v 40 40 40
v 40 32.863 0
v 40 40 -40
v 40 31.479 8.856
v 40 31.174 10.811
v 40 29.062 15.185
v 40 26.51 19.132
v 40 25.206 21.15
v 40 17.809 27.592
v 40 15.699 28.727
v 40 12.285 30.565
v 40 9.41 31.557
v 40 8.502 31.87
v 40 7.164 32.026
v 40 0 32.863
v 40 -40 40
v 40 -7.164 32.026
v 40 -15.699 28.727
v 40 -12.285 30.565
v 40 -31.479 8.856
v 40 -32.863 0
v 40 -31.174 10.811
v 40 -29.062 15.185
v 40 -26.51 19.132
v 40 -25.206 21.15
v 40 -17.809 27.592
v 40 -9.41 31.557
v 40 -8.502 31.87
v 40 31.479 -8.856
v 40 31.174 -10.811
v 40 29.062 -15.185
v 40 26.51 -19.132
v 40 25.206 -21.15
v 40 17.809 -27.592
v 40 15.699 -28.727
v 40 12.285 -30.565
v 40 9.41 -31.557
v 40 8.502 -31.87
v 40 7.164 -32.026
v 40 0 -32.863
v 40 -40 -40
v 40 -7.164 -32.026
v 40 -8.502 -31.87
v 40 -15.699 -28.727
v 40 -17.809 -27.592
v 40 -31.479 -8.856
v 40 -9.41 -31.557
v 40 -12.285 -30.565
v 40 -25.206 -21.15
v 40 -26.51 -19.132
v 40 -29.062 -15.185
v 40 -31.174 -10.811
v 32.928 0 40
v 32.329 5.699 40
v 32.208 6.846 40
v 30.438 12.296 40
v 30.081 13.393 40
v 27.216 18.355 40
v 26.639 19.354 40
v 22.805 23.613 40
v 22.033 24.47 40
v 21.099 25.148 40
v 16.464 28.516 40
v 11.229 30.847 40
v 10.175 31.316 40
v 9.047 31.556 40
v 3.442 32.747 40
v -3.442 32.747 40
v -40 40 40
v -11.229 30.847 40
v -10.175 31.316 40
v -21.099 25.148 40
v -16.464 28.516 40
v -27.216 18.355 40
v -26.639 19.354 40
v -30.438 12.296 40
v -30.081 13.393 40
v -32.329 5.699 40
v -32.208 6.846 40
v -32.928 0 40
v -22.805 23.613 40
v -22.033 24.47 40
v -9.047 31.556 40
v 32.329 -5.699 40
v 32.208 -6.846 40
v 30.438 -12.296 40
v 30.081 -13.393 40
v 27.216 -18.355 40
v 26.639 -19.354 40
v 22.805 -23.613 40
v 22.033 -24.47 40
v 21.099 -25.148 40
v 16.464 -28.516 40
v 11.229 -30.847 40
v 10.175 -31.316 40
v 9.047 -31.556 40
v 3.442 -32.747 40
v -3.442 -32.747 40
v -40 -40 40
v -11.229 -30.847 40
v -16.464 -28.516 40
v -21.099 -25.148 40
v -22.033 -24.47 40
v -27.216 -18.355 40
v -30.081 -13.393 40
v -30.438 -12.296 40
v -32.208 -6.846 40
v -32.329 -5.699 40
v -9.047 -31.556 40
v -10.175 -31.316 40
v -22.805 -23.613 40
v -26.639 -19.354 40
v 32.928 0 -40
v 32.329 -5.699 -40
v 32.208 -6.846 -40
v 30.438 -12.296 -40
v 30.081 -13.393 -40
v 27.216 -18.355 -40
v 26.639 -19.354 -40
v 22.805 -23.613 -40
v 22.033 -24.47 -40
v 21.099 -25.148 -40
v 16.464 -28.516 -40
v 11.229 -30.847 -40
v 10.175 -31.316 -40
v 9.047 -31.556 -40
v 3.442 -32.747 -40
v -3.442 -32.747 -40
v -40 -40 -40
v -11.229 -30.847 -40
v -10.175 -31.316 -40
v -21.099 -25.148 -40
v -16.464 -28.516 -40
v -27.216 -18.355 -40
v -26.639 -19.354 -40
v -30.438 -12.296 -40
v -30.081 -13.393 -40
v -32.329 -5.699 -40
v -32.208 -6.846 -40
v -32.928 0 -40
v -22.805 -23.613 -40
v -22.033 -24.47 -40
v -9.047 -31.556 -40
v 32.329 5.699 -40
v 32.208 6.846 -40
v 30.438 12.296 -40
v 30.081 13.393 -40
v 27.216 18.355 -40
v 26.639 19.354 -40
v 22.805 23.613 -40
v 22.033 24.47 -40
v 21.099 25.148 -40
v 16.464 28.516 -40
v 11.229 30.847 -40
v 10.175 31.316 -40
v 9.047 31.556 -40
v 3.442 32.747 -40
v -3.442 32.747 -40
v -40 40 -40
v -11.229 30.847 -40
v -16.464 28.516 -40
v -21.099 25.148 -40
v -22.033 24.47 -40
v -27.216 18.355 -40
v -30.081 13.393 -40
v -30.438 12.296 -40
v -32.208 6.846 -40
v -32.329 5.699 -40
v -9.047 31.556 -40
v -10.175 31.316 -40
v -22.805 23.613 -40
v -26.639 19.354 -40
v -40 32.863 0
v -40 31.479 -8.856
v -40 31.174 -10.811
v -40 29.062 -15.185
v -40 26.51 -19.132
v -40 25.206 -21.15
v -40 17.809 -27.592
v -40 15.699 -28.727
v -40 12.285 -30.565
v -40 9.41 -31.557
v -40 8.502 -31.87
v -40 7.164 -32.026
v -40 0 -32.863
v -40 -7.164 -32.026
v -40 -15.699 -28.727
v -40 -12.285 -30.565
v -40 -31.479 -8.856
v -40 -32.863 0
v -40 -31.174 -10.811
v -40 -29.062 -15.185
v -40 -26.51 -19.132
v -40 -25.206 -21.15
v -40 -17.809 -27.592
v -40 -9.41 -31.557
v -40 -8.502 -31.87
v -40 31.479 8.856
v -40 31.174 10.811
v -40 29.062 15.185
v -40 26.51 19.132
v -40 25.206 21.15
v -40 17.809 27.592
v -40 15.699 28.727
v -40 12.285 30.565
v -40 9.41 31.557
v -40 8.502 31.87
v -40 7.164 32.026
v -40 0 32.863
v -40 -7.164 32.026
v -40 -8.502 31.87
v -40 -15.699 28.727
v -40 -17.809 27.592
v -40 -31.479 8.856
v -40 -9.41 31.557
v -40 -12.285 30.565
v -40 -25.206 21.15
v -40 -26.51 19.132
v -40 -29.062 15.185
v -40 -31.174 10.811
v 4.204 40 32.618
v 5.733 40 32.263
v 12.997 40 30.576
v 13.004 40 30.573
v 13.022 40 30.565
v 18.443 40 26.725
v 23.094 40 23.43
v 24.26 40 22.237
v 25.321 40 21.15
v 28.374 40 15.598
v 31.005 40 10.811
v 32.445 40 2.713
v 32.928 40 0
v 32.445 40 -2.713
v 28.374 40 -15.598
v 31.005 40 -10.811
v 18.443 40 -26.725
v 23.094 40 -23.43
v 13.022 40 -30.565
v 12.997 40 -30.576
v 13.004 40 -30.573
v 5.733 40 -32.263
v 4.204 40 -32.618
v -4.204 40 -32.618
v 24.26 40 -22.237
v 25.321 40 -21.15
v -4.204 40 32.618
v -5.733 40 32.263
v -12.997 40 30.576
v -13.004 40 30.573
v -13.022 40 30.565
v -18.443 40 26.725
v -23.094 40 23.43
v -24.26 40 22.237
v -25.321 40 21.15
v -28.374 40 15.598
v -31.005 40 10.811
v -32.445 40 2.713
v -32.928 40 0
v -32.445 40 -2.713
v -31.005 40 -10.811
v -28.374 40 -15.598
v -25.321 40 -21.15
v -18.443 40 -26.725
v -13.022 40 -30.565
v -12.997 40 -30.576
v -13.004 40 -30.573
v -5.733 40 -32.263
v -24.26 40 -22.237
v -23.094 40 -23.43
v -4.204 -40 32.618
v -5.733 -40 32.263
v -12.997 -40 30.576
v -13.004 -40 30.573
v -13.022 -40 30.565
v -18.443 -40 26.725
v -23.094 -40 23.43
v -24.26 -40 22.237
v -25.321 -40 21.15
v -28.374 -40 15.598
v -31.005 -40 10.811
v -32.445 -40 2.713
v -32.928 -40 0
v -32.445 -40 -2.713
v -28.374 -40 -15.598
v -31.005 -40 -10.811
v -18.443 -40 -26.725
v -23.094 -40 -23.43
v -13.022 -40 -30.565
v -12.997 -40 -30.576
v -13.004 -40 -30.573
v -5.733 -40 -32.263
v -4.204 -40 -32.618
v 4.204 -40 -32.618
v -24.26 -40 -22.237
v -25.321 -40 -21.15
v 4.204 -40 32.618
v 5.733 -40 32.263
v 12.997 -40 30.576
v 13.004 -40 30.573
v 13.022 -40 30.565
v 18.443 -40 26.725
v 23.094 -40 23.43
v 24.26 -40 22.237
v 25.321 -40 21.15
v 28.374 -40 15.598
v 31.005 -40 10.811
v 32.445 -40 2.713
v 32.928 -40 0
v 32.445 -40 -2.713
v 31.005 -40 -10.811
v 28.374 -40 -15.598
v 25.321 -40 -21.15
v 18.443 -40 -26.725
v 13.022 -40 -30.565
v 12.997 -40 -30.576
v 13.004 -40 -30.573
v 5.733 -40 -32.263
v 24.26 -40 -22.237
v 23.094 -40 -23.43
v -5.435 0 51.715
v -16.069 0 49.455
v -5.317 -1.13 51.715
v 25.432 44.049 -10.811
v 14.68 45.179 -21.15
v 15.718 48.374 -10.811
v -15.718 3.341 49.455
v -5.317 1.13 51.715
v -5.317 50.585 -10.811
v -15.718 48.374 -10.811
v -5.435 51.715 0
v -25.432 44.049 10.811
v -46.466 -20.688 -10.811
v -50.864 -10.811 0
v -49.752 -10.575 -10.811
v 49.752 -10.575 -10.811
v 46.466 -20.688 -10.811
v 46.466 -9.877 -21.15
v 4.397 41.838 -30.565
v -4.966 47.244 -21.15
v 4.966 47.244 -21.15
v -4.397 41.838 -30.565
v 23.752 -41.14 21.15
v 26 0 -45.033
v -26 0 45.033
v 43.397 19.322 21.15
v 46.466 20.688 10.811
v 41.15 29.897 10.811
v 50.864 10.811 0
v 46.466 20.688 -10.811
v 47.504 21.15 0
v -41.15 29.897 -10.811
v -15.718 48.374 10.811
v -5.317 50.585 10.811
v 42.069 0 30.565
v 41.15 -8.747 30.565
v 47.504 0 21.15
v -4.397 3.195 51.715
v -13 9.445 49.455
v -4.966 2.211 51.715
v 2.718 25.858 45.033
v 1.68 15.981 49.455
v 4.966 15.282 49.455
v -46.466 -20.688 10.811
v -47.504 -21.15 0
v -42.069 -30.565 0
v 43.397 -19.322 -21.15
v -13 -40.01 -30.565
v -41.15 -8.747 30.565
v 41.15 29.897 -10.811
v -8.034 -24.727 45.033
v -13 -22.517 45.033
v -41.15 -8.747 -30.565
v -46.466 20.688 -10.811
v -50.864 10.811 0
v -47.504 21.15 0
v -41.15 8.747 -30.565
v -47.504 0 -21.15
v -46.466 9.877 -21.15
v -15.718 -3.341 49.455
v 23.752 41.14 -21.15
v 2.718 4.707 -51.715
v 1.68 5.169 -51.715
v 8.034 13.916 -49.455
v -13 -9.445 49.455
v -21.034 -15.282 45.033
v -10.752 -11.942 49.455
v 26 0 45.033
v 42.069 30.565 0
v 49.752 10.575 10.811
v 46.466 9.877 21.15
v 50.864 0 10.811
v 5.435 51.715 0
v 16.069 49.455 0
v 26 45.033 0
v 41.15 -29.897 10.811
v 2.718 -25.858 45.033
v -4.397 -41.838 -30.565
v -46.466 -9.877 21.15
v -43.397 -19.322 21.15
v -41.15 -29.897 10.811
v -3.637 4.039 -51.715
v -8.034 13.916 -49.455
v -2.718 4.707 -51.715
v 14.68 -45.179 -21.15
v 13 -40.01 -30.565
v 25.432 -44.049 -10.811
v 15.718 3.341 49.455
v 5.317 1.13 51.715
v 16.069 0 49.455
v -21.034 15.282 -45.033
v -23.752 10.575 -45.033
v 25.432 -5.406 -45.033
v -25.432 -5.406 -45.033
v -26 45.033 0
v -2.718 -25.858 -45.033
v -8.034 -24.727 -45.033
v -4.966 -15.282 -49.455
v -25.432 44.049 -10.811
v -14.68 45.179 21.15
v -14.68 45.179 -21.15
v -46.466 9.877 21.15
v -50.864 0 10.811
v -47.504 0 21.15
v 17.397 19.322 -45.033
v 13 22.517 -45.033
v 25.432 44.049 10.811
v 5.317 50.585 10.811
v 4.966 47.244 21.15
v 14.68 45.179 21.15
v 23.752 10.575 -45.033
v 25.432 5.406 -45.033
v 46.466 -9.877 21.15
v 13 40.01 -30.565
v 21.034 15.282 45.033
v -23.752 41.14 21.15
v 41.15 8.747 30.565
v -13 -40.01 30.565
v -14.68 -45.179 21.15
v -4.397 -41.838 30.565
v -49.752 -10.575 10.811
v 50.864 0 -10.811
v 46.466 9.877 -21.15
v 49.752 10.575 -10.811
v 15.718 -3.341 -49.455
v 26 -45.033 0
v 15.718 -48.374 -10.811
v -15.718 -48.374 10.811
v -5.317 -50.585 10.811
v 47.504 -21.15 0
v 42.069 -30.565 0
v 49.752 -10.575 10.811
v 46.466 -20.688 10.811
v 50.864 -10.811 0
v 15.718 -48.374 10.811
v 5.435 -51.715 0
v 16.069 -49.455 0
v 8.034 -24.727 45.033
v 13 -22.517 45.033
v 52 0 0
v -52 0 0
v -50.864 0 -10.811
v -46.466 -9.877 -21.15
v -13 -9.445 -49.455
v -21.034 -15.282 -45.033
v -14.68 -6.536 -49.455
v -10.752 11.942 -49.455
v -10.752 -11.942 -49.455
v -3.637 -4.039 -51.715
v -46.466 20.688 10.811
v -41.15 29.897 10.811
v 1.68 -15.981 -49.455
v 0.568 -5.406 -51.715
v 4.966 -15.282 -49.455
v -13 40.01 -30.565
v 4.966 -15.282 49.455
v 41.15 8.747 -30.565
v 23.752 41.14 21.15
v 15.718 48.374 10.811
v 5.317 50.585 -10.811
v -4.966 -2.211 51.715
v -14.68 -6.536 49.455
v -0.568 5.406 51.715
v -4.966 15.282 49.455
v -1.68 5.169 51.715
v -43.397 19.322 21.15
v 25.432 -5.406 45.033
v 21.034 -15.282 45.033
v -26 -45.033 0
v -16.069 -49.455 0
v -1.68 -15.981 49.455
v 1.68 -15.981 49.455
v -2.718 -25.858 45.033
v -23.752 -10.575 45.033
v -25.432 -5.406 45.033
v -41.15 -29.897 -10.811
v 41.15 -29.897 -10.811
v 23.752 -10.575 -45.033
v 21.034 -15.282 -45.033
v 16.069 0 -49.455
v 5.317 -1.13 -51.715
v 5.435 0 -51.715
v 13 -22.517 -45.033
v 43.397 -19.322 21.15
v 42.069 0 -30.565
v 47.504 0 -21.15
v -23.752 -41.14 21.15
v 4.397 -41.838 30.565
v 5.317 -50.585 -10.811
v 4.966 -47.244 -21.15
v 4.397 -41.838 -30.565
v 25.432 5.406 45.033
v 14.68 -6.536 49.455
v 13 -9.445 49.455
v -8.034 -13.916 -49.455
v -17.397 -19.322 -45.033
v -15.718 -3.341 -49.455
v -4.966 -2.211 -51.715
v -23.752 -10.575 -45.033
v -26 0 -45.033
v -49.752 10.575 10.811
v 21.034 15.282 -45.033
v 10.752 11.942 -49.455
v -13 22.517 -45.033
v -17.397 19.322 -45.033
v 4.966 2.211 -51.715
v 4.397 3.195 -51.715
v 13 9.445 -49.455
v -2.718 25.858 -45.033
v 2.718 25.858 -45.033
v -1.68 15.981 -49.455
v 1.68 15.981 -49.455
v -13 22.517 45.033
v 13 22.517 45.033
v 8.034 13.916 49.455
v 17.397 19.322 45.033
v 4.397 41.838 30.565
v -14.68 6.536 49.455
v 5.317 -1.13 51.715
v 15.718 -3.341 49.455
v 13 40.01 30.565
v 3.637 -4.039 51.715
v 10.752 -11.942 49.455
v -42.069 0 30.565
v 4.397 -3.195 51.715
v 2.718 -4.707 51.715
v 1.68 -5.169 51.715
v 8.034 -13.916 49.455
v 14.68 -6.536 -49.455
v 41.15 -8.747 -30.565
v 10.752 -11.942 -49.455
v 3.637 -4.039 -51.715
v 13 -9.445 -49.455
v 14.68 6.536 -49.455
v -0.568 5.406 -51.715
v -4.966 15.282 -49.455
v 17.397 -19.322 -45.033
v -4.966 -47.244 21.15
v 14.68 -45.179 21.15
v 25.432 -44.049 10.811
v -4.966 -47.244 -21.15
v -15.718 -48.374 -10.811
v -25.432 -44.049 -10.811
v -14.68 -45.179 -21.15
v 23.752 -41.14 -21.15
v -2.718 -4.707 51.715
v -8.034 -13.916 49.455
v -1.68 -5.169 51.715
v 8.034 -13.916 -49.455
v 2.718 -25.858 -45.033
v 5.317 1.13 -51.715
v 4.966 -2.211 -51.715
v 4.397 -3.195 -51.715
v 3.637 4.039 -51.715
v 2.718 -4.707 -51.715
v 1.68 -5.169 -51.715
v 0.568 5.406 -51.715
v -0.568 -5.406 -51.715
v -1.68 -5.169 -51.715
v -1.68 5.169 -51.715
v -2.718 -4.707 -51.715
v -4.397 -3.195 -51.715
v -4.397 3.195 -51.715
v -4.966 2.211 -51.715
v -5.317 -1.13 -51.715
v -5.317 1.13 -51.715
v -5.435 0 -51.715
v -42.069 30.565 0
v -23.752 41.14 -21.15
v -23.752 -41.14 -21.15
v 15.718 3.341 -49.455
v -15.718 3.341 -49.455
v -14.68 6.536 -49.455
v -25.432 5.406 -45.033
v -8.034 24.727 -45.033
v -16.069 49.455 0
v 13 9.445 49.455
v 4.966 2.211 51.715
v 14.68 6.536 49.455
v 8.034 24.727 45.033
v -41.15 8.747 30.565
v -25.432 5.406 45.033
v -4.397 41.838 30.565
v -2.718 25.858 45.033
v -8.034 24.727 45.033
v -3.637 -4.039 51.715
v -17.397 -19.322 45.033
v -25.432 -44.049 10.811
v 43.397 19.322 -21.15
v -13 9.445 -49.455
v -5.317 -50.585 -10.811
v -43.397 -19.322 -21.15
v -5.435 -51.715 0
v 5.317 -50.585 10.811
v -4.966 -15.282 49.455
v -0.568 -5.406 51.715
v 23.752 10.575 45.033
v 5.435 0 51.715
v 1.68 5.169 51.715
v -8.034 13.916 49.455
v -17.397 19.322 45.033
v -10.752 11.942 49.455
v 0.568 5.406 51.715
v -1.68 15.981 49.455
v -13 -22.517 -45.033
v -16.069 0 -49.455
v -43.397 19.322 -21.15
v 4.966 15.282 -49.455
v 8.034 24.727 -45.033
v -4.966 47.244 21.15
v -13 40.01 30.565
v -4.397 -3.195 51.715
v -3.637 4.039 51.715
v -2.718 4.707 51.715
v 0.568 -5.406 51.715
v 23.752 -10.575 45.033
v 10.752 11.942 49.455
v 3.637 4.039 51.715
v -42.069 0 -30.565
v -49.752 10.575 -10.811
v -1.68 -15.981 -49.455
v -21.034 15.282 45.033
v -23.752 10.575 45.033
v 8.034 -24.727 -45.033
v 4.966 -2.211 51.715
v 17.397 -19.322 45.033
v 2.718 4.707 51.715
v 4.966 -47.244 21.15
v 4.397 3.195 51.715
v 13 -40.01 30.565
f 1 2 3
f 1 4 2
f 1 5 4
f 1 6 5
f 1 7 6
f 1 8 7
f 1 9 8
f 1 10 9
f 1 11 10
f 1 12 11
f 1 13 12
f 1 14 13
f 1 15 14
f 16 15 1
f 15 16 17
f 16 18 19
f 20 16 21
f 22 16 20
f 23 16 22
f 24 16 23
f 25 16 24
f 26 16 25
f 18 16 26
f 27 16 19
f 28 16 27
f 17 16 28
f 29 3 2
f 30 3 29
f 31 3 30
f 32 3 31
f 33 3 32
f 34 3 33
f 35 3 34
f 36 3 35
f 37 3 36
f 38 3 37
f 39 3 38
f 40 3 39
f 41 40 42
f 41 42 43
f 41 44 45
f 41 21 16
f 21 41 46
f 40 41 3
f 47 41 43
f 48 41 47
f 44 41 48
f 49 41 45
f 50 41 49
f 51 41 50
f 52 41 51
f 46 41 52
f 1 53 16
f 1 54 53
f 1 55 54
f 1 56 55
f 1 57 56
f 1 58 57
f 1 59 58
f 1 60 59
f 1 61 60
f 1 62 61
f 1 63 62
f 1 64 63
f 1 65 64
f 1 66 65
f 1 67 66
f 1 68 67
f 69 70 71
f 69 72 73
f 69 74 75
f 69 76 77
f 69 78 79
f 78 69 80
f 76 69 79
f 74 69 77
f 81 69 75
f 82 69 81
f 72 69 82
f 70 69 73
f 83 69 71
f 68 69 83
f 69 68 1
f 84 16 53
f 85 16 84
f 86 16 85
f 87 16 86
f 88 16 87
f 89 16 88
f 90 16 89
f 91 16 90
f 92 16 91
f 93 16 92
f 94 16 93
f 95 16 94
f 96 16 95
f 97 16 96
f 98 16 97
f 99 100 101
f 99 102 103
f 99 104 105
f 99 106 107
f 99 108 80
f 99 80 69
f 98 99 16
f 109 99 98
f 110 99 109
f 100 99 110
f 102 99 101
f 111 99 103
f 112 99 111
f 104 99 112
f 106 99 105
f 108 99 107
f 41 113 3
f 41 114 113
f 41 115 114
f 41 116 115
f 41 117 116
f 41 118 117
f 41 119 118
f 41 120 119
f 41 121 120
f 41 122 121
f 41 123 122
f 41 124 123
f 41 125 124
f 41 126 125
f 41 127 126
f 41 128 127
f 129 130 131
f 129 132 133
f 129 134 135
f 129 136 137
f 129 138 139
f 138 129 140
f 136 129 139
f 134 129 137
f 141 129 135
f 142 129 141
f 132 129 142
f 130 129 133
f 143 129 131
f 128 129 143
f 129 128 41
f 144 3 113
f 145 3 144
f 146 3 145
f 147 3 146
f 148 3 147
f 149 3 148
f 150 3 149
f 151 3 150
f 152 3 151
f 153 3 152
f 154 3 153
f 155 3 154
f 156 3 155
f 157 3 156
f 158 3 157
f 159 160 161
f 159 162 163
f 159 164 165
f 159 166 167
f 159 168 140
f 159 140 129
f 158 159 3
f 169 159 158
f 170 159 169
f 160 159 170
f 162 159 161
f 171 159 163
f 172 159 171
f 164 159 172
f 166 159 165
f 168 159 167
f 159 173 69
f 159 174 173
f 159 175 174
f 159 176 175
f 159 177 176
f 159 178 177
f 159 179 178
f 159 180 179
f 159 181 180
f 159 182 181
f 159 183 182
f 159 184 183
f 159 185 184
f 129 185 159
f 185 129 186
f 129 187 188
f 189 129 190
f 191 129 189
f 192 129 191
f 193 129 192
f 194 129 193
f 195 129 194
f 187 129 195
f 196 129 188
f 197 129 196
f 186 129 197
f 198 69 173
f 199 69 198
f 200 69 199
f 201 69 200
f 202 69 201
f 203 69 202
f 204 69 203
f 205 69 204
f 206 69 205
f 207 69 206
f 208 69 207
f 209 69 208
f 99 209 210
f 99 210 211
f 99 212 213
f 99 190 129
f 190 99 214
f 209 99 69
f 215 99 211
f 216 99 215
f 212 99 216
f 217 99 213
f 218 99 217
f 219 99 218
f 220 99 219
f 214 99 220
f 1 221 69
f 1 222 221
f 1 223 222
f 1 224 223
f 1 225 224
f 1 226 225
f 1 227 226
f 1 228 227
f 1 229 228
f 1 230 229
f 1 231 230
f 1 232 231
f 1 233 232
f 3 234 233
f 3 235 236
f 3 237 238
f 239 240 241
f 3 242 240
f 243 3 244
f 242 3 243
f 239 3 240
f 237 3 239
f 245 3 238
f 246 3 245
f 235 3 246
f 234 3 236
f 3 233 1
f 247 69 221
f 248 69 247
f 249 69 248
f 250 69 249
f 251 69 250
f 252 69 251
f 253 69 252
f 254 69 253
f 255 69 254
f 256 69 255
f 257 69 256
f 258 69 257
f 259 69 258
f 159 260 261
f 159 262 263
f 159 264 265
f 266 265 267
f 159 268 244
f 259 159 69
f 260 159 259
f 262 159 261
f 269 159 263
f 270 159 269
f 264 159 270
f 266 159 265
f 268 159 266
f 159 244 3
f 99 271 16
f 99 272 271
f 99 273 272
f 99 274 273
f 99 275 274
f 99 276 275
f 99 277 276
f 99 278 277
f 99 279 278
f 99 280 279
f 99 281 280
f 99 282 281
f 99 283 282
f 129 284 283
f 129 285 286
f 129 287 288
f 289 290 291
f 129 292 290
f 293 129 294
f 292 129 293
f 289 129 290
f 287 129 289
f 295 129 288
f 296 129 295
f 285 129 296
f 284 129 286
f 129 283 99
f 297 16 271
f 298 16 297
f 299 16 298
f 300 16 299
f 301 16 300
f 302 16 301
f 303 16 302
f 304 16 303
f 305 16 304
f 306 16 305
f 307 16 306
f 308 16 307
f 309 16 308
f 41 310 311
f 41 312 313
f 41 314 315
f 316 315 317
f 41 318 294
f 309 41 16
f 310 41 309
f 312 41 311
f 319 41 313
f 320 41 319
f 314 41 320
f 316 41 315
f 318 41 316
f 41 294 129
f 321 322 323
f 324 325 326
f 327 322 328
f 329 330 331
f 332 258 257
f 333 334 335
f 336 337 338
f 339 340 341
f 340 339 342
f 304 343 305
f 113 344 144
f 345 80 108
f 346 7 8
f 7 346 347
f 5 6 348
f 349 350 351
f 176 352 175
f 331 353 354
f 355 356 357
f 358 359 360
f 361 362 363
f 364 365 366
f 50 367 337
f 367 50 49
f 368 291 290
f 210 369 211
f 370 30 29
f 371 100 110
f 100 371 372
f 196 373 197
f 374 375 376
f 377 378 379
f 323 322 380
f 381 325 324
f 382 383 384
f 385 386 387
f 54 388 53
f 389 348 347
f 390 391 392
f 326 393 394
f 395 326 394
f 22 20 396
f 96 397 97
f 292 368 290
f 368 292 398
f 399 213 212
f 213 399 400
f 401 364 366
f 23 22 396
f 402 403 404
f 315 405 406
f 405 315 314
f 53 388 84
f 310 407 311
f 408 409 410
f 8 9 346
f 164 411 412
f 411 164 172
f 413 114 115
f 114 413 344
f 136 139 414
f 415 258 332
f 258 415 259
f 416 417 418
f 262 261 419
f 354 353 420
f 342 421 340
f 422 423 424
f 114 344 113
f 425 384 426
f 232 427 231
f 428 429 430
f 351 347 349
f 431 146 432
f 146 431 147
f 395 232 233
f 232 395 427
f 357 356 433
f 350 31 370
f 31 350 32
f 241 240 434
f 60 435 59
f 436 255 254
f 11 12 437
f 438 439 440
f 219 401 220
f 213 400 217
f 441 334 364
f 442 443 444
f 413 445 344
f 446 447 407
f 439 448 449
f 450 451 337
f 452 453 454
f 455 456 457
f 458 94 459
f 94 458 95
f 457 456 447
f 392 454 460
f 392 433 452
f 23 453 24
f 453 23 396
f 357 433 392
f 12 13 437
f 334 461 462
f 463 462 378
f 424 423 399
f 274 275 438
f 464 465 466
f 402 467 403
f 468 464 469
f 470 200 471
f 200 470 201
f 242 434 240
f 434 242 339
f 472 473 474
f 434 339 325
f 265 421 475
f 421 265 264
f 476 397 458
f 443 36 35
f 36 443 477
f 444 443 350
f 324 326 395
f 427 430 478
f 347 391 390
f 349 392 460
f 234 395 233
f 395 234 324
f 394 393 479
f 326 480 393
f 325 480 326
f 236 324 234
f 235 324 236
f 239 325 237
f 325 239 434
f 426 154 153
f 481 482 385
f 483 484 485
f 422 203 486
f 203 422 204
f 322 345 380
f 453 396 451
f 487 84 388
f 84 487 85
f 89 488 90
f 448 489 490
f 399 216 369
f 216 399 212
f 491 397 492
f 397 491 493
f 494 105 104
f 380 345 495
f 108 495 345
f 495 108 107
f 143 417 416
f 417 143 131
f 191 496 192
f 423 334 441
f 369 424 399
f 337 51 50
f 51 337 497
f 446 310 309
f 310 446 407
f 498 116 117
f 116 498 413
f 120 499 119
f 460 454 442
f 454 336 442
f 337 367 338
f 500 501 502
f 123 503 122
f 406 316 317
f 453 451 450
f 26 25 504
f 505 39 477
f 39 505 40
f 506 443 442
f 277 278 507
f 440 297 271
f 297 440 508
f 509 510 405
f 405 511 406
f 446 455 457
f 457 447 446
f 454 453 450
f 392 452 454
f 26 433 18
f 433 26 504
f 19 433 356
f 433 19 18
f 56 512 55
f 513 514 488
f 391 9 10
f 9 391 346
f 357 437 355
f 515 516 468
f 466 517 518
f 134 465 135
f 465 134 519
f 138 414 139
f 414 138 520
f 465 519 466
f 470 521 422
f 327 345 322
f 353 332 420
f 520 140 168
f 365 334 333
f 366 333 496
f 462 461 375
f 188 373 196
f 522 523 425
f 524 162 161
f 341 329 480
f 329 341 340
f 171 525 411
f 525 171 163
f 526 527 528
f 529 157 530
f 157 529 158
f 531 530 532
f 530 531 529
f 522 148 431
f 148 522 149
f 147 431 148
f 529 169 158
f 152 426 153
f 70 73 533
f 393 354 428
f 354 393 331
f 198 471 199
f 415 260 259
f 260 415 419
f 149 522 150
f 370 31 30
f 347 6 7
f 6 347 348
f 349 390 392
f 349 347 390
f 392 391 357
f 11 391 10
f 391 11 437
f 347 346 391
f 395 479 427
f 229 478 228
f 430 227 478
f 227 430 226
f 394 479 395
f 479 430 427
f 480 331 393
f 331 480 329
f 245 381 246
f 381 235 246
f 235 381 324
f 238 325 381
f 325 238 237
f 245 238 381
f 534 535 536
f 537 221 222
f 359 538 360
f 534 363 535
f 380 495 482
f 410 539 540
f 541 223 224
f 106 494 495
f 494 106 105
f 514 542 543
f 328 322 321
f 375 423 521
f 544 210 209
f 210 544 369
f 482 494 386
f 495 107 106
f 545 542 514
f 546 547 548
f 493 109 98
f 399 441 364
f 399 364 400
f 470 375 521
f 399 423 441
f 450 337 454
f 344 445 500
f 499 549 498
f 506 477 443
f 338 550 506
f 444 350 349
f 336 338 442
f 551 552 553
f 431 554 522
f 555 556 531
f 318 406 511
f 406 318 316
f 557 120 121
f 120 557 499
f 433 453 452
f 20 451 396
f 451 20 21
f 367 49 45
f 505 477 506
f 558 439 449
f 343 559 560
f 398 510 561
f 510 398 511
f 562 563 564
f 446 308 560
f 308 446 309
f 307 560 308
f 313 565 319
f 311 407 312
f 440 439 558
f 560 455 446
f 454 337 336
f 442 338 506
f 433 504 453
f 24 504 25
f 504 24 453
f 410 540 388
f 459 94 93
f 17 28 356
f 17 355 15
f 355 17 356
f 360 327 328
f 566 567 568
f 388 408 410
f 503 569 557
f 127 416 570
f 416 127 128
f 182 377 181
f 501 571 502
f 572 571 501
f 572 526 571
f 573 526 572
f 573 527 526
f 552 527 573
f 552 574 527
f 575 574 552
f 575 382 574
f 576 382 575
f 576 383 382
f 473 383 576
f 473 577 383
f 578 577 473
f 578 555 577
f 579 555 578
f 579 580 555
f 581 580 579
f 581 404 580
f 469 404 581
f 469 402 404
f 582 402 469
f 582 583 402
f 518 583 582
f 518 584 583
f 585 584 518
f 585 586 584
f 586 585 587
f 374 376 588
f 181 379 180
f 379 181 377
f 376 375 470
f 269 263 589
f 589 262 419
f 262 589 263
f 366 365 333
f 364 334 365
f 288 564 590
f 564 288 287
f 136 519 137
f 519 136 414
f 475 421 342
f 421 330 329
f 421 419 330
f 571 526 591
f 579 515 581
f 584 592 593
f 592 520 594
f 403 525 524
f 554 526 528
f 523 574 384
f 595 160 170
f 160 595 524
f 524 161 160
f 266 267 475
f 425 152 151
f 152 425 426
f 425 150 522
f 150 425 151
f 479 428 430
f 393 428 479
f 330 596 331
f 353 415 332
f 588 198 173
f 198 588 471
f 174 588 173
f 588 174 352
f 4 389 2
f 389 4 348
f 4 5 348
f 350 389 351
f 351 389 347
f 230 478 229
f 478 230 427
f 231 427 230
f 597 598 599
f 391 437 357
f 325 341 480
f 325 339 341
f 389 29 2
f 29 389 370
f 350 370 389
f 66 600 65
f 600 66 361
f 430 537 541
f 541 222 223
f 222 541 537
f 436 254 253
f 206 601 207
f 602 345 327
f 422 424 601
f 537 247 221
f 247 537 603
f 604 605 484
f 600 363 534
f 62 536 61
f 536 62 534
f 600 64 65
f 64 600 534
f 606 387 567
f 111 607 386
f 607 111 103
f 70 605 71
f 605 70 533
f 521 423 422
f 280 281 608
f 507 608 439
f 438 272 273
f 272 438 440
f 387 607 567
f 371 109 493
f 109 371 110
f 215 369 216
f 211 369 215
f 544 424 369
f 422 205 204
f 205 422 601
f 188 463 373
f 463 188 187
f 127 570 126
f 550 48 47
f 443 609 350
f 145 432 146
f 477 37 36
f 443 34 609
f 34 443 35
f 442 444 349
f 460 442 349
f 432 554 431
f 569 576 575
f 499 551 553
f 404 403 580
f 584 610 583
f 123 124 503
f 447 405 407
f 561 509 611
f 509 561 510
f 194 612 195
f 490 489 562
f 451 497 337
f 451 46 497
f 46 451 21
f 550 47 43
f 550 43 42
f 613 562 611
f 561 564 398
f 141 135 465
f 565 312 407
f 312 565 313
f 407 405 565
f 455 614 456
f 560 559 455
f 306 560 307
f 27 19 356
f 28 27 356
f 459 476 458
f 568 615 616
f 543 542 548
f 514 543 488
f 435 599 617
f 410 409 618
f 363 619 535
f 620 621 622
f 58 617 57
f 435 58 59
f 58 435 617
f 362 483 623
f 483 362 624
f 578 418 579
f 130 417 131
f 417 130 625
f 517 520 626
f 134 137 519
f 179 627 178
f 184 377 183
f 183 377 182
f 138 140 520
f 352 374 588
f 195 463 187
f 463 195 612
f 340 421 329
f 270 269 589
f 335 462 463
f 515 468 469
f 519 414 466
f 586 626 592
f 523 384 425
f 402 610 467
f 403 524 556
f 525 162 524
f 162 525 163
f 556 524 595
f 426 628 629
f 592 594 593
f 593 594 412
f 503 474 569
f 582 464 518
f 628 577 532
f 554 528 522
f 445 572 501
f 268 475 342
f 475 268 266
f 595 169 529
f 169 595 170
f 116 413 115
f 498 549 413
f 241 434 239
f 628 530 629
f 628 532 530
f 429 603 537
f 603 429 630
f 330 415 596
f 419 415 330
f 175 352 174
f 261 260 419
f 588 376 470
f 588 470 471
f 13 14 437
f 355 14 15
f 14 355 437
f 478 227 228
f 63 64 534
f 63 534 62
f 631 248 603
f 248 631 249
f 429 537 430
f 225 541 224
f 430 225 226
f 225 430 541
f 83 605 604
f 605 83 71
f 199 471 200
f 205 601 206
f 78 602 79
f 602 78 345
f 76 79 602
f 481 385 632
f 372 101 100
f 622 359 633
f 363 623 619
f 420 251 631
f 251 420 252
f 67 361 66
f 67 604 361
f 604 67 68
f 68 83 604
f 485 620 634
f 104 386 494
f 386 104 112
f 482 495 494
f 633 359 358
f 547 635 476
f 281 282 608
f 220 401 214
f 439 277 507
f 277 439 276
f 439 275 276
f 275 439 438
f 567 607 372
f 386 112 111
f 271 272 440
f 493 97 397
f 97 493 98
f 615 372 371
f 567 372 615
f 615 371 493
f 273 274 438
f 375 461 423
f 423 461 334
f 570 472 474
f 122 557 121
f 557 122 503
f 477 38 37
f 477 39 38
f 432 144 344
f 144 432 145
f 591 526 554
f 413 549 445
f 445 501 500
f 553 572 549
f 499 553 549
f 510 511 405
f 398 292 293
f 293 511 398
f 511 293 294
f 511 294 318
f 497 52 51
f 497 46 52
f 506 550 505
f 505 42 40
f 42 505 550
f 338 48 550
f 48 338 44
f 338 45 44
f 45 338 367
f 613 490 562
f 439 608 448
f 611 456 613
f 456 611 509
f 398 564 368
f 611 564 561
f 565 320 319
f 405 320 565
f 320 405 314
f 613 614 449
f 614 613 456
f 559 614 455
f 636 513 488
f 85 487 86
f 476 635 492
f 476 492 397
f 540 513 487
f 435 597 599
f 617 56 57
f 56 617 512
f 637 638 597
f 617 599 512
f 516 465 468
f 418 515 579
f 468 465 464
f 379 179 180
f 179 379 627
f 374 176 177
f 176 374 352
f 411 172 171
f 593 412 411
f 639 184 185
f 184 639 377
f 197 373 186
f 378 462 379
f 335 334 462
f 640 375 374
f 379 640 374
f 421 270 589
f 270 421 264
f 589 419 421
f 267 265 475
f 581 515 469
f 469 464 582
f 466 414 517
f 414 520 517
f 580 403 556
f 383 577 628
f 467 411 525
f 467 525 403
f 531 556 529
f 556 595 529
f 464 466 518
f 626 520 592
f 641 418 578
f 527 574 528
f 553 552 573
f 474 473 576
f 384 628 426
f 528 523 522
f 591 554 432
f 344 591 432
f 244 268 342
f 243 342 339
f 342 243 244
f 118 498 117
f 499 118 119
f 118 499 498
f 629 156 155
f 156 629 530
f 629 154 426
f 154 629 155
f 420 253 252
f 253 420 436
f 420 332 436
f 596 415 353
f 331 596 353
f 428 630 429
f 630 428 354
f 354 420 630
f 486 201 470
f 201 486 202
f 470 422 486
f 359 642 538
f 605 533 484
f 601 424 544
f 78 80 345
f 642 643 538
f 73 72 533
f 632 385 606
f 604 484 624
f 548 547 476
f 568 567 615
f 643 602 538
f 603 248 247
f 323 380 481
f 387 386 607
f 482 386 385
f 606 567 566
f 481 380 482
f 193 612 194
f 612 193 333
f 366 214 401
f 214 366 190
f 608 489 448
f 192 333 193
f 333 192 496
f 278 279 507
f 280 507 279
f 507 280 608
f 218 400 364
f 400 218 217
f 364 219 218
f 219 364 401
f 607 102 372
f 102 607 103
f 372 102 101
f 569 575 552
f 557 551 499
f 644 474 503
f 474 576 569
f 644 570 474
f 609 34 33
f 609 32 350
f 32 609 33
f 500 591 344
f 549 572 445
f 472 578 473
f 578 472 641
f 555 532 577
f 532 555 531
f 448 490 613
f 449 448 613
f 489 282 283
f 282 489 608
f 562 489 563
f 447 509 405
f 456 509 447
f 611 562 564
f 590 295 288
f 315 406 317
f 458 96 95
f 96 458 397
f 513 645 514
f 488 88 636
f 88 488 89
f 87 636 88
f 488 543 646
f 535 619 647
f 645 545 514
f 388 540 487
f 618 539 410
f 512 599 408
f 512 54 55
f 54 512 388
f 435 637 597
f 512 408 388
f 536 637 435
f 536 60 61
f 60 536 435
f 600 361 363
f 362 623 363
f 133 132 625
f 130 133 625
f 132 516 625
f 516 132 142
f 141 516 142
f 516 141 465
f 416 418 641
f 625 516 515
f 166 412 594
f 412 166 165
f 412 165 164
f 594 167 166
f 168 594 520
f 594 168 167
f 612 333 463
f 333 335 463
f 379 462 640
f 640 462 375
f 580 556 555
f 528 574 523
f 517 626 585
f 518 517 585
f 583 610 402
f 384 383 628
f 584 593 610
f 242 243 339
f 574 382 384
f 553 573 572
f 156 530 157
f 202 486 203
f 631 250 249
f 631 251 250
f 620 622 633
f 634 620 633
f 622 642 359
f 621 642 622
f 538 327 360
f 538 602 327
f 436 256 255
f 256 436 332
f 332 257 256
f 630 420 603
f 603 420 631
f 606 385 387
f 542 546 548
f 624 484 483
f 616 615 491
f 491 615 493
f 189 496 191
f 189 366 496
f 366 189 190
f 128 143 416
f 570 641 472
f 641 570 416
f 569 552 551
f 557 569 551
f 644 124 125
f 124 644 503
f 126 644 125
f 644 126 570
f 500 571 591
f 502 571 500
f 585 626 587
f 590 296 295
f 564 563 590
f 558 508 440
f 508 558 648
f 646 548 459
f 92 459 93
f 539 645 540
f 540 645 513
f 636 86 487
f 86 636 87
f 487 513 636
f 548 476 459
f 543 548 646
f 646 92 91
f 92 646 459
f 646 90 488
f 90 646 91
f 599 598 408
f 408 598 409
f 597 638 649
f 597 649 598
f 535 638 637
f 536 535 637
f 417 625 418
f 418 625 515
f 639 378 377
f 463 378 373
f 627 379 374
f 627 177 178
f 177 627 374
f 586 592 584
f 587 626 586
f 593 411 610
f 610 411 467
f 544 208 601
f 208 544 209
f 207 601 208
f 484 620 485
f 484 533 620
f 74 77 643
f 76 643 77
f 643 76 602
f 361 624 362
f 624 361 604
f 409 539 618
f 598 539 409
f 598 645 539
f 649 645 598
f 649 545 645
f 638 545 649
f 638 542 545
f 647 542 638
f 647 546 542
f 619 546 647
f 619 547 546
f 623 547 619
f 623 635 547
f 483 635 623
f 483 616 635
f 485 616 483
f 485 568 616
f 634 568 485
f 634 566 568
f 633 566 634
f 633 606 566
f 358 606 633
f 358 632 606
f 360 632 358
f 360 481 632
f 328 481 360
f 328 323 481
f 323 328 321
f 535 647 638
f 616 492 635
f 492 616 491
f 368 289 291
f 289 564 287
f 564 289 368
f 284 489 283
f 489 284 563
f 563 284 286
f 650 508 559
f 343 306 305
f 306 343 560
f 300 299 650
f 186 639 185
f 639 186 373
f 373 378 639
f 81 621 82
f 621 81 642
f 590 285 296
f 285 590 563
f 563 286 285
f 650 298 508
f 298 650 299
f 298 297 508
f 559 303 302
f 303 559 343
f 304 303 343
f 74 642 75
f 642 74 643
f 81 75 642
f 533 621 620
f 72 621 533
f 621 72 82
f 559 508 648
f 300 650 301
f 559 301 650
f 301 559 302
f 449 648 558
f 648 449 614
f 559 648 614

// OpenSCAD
union()
{
cube([80,80,80], center=true);
color([0.2,0.8,1]) sphere(52);
}
